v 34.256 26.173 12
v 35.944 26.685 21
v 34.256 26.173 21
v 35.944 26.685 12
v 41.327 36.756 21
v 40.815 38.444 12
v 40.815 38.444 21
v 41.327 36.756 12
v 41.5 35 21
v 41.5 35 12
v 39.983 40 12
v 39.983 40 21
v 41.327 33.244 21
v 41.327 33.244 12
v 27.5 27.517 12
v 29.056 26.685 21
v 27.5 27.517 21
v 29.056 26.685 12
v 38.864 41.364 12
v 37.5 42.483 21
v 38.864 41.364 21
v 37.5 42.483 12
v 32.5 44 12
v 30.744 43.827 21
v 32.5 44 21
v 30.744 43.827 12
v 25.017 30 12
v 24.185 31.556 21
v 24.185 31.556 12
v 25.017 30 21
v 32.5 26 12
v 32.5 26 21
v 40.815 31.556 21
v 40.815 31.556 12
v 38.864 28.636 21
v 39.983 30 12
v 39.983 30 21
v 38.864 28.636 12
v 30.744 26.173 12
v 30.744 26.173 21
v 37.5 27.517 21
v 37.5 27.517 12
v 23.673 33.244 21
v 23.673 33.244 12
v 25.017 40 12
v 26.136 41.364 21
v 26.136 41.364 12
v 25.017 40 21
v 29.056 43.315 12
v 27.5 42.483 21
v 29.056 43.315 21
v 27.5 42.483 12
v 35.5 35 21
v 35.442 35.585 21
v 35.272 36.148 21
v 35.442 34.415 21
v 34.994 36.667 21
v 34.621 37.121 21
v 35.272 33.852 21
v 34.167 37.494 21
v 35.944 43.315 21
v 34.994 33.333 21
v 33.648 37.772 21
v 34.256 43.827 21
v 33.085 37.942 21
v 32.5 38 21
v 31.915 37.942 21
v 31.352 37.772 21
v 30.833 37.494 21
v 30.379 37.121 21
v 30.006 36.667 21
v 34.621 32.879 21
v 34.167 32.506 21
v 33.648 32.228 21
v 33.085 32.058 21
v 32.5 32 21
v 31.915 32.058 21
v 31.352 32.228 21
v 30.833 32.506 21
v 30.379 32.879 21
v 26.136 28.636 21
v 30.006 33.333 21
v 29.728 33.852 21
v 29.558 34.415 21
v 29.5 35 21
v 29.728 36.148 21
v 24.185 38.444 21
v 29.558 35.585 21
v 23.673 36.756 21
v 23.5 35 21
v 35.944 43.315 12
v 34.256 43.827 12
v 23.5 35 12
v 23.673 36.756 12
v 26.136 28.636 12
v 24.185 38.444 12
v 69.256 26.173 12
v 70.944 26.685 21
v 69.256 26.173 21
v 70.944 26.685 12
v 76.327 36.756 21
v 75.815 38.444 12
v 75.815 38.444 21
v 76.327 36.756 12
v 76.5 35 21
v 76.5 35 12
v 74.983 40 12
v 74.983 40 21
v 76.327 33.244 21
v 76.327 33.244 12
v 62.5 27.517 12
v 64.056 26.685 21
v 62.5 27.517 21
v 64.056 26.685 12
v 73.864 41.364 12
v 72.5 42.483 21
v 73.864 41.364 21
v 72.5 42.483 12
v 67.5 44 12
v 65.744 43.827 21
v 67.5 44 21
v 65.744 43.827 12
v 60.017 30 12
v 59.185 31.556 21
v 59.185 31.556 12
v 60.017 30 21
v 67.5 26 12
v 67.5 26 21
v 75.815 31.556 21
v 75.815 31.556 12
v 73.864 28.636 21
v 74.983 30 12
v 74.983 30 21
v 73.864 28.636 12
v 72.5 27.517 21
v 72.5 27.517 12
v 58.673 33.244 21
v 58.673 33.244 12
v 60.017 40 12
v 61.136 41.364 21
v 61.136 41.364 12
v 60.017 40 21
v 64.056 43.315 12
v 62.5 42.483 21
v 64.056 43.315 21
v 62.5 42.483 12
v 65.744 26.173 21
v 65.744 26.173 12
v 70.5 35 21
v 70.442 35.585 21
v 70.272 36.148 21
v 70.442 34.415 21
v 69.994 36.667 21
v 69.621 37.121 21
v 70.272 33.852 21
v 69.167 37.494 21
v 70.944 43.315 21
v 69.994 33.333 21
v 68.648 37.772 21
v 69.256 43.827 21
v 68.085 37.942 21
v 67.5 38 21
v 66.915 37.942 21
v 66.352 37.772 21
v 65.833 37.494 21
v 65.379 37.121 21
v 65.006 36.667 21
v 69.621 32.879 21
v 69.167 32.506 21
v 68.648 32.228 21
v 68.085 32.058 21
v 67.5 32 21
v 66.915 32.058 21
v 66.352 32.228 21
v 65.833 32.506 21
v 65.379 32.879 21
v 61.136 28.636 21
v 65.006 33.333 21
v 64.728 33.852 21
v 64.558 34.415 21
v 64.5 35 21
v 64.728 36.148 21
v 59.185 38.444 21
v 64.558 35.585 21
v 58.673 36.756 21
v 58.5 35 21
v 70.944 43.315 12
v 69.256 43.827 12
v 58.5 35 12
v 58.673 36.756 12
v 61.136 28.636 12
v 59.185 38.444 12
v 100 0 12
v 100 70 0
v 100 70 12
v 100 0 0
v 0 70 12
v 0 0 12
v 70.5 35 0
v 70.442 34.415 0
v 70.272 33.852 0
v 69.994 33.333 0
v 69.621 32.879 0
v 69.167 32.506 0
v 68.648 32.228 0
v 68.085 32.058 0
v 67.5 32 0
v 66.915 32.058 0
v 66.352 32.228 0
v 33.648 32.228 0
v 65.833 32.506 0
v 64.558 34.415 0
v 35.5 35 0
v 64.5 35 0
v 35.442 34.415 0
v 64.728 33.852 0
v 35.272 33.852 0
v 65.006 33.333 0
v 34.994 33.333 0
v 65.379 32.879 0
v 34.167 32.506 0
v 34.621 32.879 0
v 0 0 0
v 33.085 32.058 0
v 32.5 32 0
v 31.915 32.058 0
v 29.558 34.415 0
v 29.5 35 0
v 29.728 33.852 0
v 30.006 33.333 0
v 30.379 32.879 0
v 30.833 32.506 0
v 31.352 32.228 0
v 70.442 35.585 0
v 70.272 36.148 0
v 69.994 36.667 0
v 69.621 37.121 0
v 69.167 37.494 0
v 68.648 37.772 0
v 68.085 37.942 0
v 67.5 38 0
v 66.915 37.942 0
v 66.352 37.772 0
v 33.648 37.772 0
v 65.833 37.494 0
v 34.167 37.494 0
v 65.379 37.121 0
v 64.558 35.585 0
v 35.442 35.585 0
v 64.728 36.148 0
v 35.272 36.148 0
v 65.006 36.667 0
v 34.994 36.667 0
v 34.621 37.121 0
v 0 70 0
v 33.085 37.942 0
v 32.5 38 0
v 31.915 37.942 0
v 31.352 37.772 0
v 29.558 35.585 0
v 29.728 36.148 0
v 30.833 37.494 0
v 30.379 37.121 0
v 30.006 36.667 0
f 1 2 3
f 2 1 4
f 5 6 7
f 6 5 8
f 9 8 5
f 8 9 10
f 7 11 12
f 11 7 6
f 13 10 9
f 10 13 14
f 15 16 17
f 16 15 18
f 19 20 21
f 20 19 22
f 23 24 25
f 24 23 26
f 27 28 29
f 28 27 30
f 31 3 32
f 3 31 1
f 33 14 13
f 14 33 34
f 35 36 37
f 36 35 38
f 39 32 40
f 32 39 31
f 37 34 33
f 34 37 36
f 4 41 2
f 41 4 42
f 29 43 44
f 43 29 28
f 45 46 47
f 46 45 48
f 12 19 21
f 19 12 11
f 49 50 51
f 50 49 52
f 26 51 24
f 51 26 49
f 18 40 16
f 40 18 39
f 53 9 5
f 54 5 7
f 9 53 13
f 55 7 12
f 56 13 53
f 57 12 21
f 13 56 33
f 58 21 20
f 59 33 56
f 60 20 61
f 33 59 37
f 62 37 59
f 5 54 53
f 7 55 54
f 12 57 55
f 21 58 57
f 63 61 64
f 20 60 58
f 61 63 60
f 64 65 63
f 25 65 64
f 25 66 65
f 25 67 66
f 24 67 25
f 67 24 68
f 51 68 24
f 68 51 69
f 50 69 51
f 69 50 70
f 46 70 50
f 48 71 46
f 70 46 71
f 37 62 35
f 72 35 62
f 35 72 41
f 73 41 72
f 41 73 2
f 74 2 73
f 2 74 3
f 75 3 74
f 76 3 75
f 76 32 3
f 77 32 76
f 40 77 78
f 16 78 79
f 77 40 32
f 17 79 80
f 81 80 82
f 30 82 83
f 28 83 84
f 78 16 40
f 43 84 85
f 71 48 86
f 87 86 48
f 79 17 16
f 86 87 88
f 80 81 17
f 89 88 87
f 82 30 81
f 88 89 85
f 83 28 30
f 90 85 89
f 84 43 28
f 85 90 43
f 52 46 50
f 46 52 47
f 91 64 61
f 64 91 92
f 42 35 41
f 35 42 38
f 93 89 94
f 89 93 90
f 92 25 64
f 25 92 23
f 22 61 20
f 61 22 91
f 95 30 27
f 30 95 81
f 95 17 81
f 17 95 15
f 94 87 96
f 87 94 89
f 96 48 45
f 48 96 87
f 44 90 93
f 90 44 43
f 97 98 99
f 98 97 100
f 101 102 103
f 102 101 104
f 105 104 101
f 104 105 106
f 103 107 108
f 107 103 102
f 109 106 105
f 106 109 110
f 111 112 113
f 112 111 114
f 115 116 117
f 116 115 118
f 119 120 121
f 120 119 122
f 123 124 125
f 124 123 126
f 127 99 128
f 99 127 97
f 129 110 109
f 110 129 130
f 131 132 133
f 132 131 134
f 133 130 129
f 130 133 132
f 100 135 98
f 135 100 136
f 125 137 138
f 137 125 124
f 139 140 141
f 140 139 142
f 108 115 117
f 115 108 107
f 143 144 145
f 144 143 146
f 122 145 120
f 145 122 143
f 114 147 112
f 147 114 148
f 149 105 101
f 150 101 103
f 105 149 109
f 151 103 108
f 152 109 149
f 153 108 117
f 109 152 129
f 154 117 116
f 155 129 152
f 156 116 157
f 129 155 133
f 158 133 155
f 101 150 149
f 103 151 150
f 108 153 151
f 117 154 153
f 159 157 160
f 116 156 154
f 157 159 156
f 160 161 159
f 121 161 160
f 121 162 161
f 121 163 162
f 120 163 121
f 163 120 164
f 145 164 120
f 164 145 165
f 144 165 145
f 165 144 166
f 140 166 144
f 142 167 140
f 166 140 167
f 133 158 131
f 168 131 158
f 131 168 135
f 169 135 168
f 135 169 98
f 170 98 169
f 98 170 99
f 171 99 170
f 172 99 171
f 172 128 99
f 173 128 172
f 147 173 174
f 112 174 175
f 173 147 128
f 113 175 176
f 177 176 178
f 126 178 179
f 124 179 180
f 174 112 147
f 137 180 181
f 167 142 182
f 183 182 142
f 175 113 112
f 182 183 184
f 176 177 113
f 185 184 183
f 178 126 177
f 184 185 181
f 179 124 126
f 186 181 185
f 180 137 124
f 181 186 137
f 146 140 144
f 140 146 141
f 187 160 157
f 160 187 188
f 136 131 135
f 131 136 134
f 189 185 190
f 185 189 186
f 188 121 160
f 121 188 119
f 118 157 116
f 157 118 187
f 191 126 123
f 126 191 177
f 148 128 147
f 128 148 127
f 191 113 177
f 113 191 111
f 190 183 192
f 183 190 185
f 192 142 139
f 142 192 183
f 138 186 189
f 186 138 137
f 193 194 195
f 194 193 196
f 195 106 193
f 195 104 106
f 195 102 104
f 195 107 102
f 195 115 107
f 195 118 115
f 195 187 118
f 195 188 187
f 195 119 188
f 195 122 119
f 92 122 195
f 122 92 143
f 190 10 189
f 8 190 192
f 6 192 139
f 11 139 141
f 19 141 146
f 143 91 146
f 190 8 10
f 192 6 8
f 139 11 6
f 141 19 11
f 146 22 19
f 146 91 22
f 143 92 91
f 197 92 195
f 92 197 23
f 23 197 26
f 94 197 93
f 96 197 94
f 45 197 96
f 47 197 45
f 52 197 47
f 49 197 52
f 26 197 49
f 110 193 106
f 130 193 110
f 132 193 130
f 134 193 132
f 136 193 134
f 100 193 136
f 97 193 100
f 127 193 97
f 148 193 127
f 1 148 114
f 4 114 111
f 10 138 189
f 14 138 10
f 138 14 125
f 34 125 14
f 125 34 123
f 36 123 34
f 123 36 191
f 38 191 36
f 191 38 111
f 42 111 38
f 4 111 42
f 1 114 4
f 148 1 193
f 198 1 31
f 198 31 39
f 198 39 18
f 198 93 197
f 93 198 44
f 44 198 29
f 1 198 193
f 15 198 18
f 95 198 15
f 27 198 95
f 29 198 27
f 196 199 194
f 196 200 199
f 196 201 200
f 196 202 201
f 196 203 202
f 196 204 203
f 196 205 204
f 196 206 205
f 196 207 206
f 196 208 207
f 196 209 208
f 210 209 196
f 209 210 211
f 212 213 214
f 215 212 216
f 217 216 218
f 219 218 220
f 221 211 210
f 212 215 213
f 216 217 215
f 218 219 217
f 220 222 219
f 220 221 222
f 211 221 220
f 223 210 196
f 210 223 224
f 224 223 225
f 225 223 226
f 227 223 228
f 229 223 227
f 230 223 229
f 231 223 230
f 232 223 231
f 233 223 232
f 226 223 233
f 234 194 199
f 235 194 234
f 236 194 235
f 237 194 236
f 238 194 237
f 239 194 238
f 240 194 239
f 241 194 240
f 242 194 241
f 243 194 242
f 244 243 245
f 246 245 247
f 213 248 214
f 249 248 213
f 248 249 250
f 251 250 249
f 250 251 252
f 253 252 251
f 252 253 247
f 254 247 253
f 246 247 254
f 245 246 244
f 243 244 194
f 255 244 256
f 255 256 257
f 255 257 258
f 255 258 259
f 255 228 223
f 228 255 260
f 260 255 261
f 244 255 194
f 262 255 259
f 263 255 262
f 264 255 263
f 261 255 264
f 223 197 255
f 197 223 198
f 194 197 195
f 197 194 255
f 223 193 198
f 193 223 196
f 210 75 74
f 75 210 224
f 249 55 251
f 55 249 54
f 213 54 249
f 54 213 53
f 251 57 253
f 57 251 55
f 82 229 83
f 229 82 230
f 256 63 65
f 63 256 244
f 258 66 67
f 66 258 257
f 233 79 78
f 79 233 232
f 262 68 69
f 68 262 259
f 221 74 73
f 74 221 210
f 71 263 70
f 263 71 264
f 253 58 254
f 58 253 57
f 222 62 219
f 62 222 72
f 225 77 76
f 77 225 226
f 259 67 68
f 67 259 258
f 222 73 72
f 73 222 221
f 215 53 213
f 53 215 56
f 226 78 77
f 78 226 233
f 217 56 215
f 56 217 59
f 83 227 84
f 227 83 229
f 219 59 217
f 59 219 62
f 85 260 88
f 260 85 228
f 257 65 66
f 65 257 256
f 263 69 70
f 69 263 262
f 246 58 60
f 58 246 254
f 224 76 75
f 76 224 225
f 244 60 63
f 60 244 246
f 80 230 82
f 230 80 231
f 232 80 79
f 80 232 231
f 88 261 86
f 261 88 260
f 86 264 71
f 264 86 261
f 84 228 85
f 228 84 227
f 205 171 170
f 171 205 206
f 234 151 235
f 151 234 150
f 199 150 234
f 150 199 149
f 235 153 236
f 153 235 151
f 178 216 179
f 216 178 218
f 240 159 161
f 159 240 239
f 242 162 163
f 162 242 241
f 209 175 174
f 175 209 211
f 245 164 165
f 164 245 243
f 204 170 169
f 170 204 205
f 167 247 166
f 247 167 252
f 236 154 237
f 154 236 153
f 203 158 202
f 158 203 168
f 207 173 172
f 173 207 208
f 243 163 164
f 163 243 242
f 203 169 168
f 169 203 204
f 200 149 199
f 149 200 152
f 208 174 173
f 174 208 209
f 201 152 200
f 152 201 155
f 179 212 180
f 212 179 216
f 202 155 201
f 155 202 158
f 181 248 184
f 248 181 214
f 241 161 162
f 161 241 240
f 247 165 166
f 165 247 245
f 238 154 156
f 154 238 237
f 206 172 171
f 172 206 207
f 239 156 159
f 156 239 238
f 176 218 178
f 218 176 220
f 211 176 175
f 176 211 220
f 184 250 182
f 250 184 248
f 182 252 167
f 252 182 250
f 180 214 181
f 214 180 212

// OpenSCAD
$fn = 32;

// ----------------------------------------------------------------------
// Drill jig: two_boss jig
// ----------------------------------------------------------------------

// --- parameters (mm) ---
plate_l = 100;            // plate length, X
plate_w = 70;             // plate width, Y
plate_t = 12;             // plate thickness
boss_d = 18;              // guide boss diameter
boss_h = 10;              // boss height above the plate
guide_d = 6;              // guide hole diameter
boss_pitch = 35;          // boss pitch

n_boss = 2;  // guide bosses
boss_x0 = (plate_l - (n_boss - 1) * boss_pitch) / 2;  // first boss X
boss_top = plate_t - 1 + boss_h;  // boss crown height
total_h = boss_top;  // overall height

difference() {
  union() {
  cube([plate_l, plate_w, plate_t]);
  for (i = [0 : n_boss - 1])
    translate([boss_x0 + i * boss_pitch, plate_w / 2, plate_t - 1])
      cylinder(h = boss_h, d = boss_d);
  }
  for (i = [0 : n_boss - 1])
    translate([boss_x0 + i * boss_pitch, plate_w / 2, -1])
      cylinder(h = plate_t + boss_h, d = guide_d);
}
